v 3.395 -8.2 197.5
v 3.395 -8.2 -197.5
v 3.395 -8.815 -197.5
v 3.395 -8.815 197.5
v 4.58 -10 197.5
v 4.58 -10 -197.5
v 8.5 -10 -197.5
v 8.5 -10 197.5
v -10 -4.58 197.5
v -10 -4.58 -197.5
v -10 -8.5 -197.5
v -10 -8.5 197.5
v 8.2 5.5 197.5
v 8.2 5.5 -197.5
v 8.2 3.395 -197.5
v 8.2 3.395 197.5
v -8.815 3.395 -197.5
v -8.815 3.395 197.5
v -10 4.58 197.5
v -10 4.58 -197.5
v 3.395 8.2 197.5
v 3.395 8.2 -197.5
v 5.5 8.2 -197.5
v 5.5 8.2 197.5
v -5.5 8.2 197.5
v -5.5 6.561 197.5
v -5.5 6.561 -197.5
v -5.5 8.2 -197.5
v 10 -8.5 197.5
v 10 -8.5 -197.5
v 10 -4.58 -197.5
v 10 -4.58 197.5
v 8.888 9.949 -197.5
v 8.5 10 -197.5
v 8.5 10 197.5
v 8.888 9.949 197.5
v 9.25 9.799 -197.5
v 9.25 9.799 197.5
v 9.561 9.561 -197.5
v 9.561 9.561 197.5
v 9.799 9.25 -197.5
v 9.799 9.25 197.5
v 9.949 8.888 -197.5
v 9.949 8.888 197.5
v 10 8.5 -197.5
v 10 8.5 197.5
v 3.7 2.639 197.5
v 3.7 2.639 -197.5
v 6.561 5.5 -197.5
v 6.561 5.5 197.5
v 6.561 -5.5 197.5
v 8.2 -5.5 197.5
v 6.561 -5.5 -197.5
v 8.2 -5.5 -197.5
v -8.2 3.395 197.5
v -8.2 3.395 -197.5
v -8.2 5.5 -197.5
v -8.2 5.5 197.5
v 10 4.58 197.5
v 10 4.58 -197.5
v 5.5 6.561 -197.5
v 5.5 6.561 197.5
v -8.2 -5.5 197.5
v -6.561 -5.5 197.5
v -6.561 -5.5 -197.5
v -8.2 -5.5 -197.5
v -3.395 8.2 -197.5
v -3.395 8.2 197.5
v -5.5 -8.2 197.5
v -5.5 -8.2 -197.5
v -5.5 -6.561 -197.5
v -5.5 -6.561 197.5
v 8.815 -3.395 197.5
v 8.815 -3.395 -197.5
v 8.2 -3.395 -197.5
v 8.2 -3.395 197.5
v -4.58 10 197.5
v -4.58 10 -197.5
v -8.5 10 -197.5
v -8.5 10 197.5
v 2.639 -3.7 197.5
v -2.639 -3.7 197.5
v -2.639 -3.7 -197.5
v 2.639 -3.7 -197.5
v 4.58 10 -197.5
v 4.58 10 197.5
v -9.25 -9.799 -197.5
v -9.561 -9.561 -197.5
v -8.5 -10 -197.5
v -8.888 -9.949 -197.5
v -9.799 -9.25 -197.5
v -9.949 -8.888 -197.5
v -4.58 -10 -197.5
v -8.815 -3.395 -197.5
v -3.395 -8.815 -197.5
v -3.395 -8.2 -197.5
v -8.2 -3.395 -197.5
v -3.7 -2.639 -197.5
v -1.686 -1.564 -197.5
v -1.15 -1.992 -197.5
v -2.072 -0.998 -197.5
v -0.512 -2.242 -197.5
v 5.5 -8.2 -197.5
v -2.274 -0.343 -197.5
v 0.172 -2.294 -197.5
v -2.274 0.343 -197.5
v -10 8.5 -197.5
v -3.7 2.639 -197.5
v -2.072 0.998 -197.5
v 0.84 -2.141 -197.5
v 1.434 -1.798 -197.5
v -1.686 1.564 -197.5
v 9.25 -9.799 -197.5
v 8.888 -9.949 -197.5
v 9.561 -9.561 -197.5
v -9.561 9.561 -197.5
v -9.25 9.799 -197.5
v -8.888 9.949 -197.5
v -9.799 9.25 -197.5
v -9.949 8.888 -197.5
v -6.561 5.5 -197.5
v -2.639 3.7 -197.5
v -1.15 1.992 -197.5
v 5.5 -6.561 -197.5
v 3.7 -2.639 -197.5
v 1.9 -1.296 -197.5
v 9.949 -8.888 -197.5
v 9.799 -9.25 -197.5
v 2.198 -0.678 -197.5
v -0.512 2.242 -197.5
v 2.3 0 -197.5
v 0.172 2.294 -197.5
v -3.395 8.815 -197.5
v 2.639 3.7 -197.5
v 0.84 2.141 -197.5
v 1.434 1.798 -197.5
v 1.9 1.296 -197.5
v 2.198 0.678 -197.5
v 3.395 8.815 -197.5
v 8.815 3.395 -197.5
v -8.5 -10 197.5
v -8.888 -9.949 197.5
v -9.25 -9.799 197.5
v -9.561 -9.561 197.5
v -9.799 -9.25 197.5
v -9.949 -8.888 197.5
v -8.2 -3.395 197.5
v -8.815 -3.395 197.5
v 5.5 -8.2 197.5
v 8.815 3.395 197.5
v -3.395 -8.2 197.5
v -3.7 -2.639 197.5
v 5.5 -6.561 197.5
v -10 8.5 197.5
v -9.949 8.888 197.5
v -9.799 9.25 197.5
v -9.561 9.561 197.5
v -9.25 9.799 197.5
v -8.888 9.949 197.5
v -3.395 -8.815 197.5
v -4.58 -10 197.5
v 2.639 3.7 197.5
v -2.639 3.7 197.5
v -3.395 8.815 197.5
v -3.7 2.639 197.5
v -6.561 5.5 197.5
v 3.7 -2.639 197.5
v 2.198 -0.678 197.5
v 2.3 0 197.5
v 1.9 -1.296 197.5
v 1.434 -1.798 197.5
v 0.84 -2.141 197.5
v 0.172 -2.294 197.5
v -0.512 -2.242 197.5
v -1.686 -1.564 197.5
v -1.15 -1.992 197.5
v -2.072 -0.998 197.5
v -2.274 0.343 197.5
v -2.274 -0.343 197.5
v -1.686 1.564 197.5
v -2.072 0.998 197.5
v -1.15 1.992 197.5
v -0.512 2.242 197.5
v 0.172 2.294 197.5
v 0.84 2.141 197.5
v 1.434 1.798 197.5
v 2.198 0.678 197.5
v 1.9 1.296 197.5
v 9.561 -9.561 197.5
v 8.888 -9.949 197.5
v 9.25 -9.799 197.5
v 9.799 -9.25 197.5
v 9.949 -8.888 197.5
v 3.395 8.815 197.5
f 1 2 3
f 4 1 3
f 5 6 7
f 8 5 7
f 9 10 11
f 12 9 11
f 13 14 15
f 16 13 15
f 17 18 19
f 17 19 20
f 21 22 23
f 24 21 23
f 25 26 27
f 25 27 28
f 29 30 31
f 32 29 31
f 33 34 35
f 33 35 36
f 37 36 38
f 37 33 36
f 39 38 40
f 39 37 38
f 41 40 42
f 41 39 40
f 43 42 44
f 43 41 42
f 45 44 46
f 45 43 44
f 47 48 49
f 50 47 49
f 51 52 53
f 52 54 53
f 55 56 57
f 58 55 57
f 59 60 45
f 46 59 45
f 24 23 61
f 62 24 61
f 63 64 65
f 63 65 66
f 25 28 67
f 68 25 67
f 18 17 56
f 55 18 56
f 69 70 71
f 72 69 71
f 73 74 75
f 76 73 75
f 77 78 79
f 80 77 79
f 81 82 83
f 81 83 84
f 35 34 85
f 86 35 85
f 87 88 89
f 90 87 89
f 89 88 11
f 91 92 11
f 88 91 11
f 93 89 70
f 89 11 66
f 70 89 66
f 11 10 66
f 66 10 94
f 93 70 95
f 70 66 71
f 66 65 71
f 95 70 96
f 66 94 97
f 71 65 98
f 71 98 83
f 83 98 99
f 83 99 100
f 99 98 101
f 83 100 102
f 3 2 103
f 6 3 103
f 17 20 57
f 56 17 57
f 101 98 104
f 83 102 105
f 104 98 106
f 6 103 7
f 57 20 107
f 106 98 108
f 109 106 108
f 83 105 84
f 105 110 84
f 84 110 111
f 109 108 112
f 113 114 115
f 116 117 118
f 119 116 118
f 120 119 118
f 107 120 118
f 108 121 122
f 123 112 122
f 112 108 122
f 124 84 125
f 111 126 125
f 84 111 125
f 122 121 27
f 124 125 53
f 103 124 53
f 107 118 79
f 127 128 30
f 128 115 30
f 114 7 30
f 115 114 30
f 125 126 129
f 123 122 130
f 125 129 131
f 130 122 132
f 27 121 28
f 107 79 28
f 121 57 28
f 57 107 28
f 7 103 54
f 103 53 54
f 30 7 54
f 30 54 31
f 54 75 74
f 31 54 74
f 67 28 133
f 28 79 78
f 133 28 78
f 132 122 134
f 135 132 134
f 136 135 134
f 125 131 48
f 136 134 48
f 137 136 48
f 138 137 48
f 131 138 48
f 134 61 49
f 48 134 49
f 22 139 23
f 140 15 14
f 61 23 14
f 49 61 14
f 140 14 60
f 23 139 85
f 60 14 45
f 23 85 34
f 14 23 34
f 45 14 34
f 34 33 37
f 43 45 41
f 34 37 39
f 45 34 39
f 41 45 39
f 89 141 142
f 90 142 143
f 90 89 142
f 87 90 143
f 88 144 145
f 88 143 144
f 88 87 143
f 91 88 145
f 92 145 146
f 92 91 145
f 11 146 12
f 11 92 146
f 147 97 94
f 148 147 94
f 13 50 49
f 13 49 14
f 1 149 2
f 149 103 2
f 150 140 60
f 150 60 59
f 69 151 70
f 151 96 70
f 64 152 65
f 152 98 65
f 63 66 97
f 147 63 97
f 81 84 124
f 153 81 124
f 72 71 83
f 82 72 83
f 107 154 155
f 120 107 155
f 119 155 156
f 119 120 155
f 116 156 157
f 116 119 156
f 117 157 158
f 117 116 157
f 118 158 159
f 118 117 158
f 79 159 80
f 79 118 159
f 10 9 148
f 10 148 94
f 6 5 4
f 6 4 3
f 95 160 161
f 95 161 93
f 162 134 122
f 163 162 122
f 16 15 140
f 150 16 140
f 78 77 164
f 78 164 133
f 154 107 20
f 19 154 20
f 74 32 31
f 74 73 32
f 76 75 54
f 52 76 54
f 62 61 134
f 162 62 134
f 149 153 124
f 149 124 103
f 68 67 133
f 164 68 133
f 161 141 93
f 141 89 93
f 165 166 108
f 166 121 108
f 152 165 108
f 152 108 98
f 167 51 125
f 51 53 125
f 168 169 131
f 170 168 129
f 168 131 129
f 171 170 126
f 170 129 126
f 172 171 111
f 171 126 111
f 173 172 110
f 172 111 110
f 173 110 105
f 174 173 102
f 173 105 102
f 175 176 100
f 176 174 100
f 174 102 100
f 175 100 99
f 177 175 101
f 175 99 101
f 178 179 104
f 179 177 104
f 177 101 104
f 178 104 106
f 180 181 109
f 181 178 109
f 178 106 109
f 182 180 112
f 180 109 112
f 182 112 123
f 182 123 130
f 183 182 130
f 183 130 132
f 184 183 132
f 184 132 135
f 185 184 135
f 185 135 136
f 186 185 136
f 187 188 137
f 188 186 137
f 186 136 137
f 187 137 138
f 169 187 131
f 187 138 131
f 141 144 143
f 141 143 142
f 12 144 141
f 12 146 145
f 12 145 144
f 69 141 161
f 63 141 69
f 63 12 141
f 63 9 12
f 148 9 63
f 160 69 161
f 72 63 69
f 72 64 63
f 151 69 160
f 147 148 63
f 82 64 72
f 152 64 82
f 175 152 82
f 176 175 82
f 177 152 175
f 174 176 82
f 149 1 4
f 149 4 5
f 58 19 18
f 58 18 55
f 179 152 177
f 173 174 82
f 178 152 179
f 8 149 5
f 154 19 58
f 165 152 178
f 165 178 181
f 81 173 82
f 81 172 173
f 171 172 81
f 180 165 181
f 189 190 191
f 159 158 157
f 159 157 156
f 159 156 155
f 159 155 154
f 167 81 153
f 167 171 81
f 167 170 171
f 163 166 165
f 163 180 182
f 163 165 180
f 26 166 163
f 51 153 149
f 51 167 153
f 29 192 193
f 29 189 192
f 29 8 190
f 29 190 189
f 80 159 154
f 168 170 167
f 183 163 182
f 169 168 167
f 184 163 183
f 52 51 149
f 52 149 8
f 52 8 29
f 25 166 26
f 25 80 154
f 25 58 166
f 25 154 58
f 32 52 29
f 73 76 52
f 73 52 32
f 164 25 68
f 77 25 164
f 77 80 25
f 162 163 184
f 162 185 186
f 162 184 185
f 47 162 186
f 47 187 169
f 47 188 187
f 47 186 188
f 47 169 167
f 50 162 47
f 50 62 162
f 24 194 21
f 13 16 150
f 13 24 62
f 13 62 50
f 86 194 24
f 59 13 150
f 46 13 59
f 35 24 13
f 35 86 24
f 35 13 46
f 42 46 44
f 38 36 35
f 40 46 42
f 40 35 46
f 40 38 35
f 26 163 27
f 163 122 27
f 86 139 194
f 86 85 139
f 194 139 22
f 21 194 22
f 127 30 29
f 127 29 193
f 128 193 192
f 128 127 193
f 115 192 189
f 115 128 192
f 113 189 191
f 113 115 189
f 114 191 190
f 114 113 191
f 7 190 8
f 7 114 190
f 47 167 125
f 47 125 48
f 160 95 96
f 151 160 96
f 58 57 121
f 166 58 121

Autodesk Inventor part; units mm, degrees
ref_plane "YZ Plane" through (0, 0, 0) normal (1, 0, 0) x (0, 1, 0)
ref_plane "XZ Plane" through (0, 0, 0) normal (0, 1, 0) x (-1, 0, 0)
ref_plane "XY Plane" through (0, 0, 0) normal (0, 0, 1) x (1, 0, 0)
sketch "Sketch1" plane through (0, 0, 0) normal (0, 0, 1) x (1, 0, 0)
  line L0 (0, 3.7) -> (-2.6393, 3.7)
  line L1 (-2.6393, 3.7) -> (-5.5, 6.5607)
  line L2 (-5.5, 6.5607) -> (-5.5, 8.2)
  line L3 (-5.5, 8.2) -> (-3.395, 8.2)
  line L4 (-3.395, 8.2) -> (-3.395, 10)
  line L5 (-3.395, 10) -> (-10, 10)
  line L6 (-10, 10) -> (-10, 3.395)
  line L7 (-10, 3.395) -> (-8.2, 3.395)
  line L8 (-8.2, 3.395) -> (-8.2, 5.5)
  line L9 (-8.2, 5.5) -> (-6.5607, 5.5)
  line L10 (-6.5607, 5.5) -> (-3.7, 2.6393)
  line L11 (-3.7, 2.6393) -> (-3.7, 0)
  line L12 (0, 0) -> (-10, 10) construction
  circle A0 centre (0, 0) radius 2.3
  line L13 (-22.6601, 0) -> (65.9605, 0) projected
  line L14 (-3.7, 0) -> (0, 0)
  line L15 (0, 0) -> (0, 3.7)
  line L16 (11.2521, 18.9743) -> (53.3004, 18.9743) construction
  line L17 (53.3004, 18.9743) -> (53.3004, -5.624) construction
  line L18 (53.3004, -5.624) -> (11.2521, -5.624) construction
  line L19 (11.2521, -5.624) -> (11.2521, 18.9743) construction
  point P0 (-2.3, 0)
  point P1 (0, 2.3)
  dimension "d0" = 1.5
  dimension "d6" = 6.3
  dimension "d9" = 4.6
  dimension "d18" = 135
  dimension "d22" = 20
  dimension "d34" = 11
  dimension "d35" = 6.79
  dimension "d36" = 1.8
extrude "Extrusion1" add sketch "Sketch1" along normal mid plane 395 contours L15 A0 L13 L11 L10 L9 L8 L7 L6 L5 L4 L3 L2 L1 L0
pattern_circular "Circular Pattern1" count 4 over 360 about axis through (0, 0, -10) along (0, 0, 1) of "Extrusion1"
chamfer "Chamfer1" distance 1.185 angle 45 8 edges at (-3.395, 10, 0) (3.395, 10, 0) (10, 3.395, 0) (10, -3.395, 0) (3.395, -10, 0) (-3.395, -10, 0) (-10, -3.395, 0) (-10, 3.395, 0)
fillet "Fillet1" radius 1.5 4 edges at (-10, 10, 0) (10, 10, 0) (-10, -10, 0) (10, -10, 0)
equation "\"d24\" = WorkspaceLength"
equation "\"GridProcutClearance\" = 3"
equation "\"GridBorderThickness\" = 5"
equation "\"GridBorderFillets\" = 7"
equation "\"GridTotalSize\" = 63"
equation "\"BaseTotalWidth\" = 412"
equation "\"BaseTotalLength\" = 624"
equation "\"DistanceBetweenGrid\" = 5"
equation "\"WorkspaceLength\" = 395"
equation "\"WorkspaceWidth\" = 332"
equation "\"AxesBaseFillet\" = 15"
equation "\"Zaxis\" = 127"
properties part number "2020aluminum_extrusion_black" material "Aluminum 6061"
